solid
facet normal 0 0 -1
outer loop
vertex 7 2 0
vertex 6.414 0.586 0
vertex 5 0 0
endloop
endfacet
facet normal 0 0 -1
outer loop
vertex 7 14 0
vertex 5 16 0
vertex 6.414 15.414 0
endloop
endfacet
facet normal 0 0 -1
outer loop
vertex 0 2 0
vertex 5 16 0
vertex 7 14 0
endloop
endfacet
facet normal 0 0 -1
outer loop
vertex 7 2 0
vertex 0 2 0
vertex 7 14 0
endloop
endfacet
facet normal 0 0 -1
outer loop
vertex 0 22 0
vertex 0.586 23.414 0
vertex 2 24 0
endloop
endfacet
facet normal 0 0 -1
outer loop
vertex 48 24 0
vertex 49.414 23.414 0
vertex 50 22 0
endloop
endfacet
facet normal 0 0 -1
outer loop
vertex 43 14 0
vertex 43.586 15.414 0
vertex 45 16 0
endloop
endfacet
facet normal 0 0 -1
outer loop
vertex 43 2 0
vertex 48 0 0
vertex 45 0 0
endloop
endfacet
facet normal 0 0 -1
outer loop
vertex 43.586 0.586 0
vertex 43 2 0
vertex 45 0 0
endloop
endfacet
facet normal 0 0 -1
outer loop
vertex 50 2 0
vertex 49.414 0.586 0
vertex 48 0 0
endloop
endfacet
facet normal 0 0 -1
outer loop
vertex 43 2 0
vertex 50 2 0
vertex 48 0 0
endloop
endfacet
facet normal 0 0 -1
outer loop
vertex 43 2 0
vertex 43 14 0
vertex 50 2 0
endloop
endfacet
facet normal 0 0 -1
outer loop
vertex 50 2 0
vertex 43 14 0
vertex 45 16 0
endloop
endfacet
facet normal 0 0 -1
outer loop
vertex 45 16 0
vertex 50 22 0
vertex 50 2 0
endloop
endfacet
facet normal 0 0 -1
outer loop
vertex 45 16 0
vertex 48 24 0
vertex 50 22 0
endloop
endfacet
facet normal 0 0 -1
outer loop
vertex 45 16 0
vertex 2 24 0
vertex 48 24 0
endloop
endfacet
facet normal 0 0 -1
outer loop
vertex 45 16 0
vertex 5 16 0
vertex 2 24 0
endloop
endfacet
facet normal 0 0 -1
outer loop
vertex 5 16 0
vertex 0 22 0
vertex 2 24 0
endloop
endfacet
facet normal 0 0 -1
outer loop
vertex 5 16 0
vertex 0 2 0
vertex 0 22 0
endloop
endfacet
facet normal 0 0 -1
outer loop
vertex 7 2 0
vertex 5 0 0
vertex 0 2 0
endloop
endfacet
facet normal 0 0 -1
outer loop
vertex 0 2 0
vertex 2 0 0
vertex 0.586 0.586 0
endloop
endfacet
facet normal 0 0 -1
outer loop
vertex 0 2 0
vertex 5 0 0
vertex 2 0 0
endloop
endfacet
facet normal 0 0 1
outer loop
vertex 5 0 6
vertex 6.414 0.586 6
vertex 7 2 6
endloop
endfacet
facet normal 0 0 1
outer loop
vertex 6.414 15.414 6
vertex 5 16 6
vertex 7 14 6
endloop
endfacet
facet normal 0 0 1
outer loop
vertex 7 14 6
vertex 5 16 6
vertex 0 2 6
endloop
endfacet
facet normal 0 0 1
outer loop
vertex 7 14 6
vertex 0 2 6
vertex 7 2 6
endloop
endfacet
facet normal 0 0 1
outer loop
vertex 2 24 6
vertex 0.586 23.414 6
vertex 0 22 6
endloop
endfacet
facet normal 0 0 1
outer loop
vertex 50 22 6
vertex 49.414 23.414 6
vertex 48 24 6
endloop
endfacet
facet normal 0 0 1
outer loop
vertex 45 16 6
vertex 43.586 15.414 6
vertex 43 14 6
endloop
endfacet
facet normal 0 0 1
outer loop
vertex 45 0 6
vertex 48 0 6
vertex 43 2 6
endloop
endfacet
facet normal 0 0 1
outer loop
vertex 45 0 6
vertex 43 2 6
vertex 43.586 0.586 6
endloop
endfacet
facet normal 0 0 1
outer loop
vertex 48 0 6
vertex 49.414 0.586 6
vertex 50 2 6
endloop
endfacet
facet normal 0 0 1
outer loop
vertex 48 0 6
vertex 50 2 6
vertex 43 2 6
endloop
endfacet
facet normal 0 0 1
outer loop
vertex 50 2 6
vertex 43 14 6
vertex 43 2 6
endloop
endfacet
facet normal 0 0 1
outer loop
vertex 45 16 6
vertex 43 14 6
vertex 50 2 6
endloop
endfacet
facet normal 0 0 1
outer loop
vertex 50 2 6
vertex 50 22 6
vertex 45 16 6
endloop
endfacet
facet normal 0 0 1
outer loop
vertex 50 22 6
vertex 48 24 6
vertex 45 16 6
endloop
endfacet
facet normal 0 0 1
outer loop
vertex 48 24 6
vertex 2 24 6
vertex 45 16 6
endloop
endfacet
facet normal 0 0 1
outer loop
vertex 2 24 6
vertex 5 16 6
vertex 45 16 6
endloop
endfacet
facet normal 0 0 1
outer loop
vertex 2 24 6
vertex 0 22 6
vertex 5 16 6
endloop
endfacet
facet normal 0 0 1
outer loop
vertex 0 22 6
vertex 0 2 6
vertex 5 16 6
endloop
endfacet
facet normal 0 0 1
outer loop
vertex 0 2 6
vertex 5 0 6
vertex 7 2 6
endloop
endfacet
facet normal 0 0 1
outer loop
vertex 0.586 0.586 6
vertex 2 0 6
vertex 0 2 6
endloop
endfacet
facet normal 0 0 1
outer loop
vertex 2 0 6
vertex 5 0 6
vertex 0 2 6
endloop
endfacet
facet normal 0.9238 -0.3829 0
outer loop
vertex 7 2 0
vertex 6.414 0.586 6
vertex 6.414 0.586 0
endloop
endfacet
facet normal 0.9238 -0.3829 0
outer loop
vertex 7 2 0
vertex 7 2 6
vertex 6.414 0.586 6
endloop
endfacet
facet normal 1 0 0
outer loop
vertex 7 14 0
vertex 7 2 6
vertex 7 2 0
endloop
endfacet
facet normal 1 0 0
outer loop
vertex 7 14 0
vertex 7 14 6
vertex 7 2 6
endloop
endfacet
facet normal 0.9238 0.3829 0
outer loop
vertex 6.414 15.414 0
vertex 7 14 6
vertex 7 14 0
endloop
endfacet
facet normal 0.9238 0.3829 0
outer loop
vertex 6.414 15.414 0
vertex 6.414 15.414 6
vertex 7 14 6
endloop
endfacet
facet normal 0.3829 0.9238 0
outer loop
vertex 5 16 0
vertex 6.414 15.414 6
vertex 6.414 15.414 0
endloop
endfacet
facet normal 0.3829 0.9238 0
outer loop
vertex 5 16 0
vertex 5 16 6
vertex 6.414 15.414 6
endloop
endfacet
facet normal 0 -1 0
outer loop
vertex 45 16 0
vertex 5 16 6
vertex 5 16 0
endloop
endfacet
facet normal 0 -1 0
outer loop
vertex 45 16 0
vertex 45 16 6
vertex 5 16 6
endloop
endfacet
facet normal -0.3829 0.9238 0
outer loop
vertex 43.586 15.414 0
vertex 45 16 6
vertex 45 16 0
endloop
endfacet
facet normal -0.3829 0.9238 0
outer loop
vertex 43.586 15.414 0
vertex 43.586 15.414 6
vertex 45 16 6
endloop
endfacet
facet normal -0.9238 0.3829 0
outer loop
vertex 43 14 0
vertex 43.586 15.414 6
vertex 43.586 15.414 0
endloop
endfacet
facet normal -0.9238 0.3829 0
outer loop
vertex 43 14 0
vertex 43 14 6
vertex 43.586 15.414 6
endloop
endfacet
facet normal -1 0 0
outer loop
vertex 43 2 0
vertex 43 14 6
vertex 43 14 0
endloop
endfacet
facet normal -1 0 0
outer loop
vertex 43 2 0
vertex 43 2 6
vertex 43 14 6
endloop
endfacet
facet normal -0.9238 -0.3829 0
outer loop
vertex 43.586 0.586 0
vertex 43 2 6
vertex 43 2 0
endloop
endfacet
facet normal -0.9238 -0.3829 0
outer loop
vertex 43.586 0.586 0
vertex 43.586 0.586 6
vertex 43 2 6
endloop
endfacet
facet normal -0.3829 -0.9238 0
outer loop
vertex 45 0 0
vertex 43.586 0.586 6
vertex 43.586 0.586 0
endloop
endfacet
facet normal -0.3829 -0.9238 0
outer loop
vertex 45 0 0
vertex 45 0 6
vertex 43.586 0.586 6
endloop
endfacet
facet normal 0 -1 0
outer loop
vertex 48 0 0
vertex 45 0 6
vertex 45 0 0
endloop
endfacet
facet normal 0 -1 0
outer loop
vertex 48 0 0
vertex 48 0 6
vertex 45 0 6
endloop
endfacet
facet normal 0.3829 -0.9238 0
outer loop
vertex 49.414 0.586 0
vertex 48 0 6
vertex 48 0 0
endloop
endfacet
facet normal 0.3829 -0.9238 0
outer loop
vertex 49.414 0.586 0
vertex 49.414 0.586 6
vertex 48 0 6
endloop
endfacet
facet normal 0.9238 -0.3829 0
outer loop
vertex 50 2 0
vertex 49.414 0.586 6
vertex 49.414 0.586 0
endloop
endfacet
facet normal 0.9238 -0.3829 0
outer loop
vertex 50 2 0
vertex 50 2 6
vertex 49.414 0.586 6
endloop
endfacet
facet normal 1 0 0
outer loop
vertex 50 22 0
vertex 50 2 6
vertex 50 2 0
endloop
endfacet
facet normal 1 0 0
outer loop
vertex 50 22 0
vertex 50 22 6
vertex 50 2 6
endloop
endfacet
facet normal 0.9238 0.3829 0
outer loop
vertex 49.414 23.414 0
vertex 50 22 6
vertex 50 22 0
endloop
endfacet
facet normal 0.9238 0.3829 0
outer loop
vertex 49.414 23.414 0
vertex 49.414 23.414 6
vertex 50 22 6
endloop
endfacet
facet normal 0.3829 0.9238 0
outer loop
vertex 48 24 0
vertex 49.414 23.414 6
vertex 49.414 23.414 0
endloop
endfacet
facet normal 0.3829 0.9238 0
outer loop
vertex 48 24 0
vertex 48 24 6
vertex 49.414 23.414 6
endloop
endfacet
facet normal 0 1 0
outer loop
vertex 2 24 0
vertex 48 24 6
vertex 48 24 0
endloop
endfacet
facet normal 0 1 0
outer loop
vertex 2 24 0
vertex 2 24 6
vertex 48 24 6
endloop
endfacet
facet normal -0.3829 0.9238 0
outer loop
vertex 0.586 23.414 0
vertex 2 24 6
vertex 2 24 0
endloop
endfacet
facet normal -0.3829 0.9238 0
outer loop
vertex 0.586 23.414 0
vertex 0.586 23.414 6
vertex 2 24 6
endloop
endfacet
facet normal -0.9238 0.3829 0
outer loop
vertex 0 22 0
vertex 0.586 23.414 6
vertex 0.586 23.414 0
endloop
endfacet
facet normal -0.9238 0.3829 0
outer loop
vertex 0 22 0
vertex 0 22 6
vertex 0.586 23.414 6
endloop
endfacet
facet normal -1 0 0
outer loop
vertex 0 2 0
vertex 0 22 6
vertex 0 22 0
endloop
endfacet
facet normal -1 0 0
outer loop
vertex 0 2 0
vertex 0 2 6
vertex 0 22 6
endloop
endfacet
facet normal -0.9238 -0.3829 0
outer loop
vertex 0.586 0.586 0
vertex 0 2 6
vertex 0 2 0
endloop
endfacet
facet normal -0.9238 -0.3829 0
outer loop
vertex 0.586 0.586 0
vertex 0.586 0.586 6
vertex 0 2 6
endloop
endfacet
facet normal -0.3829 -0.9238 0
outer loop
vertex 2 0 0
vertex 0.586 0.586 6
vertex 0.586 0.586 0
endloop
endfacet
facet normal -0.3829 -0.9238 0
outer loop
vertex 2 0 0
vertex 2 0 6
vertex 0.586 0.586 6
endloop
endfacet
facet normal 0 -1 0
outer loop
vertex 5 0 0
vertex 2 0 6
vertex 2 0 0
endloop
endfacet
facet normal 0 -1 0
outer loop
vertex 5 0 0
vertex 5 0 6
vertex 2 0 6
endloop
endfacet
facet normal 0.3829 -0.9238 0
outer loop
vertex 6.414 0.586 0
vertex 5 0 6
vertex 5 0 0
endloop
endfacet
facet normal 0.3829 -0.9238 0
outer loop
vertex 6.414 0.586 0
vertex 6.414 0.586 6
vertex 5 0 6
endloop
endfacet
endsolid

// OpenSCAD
$fn = 32;

// ----------------------------------------------------------------------
// Clip blank: staple clip, 6 mm thick
// ----------------------------------------------------------------------

// --- parameters (mm) ---
profile_height = 6;       // extrusion height
profile_points = 24;      // points of the closed outline

profile = [[0, 2], [0.586, 0.586], [2, 0], [5, 0], [6.414, 0.586], [7, 2], [7, 14], [6.414, 15.414], [5, 16], [45, 16], [43.586, 15.414], [43, 14], [43, 2], [43.586, 0.586], [45, 0], [48, 0], [49.414, 0.586], [50, 2], [50, 22], [49.414, 23.414], [48, 24], [2, 24], [0.586, 23.414], [0, 22]];  // single closed polygon, 24 points, counter clockwise

// --- the one profile operation ---
linear_extrude(height = profile_height) polygon(points = profile);
